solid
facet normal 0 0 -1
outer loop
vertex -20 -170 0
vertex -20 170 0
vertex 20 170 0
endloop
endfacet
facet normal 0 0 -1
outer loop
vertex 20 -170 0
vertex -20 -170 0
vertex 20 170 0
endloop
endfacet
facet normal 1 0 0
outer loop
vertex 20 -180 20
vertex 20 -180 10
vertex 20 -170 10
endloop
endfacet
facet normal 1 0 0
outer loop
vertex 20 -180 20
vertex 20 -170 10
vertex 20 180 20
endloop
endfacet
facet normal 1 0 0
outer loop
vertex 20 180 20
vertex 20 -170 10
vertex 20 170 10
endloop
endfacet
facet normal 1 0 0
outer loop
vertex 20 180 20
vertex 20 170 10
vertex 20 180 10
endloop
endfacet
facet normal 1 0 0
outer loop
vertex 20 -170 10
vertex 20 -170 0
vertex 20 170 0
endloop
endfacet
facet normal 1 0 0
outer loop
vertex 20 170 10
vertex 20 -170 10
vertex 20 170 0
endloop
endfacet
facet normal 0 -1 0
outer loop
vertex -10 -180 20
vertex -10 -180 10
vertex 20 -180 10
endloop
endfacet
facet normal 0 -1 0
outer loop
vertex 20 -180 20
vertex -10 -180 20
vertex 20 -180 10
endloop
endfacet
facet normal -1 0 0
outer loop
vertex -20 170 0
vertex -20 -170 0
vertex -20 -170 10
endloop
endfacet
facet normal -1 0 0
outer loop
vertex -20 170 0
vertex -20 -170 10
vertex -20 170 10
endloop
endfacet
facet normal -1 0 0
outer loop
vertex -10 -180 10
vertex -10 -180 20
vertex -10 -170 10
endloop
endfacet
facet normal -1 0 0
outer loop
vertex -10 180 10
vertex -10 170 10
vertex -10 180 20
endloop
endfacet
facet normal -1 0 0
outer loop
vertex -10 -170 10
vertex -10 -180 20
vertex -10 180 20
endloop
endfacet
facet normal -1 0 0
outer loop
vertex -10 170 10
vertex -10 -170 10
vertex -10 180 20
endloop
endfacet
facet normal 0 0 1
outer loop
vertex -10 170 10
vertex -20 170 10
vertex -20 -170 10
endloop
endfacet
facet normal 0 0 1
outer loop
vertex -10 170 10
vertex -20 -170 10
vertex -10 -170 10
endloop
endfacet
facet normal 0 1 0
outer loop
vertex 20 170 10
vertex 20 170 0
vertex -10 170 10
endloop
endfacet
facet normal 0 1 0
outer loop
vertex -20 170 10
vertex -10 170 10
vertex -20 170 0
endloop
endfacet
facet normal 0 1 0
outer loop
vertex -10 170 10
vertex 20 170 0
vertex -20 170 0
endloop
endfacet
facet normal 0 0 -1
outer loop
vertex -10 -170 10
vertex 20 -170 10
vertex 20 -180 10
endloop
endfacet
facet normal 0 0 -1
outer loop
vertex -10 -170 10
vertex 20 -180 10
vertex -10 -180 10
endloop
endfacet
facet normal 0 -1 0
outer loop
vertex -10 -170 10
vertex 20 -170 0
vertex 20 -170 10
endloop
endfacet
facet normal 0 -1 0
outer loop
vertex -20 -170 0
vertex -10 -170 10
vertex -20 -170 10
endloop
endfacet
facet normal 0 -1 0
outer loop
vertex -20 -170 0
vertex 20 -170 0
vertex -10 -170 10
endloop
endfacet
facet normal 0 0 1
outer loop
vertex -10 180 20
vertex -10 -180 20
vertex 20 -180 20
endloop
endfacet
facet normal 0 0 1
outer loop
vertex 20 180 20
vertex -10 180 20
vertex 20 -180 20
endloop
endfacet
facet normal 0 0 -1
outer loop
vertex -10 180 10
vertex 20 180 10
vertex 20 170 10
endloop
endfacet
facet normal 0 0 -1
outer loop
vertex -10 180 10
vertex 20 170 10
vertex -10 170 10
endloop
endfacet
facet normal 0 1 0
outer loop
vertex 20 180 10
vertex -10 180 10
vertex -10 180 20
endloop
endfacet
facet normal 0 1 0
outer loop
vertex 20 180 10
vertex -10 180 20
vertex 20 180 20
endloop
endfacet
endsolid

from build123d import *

# Parameters (mm, degrees)
SKETCH1_W           = 40
SKETCH1_H           = 360
BOSS_EXTRUDE1_DEPTH = 20
SKETCH2_W           = 10
SKETCH2_H           = 360
CUT_EXTRUDE1_DEPTH  = 10
SKETCH3_W           = 40
SKETCH3_H           = 10
CUT_EXTRUDE2_DEPTH  = 10


with BuildPart() as part:
    # Sketch1 → Boss-Extrude1 (new body)
    with BuildSketch(Plane.XY):
        Rectangle(SKETCH1_W, SKETCH1_H)
    extrude(amount=BOSS_EXTRUDE1_DEPTH)

    # Sketch2 → Cut-Extrude1 (cut)
    with BuildSketch(Plane.XY.offset(20)):
        with Locations((-15, 0)):
            Rectangle(SKETCH2_W, SKETCH2_H)
    extrude(amount=-CUT_EXTRUDE1_DEPTH, mode=Mode.SUBTRACT)

    # Sketch3 → Cut-Extrude2 (cut)
    with BuildSketch(Plane(origin=(0, 0, 0), x_dir=(-1, 0, 0), z_dir=(0, 0, -1))):
        with Locations((0, 175)):
            Rectangle(SKETCH3_W, SKETCH3_H)
        with Locations((0, -175)):
            Rectangle(SKETCH3_W, SKETCH3_H)
    extrude(amount=-CUT_EXTRUDE2_DEPTH, mode=Mode.SUBTRACT)


solid = part.part
